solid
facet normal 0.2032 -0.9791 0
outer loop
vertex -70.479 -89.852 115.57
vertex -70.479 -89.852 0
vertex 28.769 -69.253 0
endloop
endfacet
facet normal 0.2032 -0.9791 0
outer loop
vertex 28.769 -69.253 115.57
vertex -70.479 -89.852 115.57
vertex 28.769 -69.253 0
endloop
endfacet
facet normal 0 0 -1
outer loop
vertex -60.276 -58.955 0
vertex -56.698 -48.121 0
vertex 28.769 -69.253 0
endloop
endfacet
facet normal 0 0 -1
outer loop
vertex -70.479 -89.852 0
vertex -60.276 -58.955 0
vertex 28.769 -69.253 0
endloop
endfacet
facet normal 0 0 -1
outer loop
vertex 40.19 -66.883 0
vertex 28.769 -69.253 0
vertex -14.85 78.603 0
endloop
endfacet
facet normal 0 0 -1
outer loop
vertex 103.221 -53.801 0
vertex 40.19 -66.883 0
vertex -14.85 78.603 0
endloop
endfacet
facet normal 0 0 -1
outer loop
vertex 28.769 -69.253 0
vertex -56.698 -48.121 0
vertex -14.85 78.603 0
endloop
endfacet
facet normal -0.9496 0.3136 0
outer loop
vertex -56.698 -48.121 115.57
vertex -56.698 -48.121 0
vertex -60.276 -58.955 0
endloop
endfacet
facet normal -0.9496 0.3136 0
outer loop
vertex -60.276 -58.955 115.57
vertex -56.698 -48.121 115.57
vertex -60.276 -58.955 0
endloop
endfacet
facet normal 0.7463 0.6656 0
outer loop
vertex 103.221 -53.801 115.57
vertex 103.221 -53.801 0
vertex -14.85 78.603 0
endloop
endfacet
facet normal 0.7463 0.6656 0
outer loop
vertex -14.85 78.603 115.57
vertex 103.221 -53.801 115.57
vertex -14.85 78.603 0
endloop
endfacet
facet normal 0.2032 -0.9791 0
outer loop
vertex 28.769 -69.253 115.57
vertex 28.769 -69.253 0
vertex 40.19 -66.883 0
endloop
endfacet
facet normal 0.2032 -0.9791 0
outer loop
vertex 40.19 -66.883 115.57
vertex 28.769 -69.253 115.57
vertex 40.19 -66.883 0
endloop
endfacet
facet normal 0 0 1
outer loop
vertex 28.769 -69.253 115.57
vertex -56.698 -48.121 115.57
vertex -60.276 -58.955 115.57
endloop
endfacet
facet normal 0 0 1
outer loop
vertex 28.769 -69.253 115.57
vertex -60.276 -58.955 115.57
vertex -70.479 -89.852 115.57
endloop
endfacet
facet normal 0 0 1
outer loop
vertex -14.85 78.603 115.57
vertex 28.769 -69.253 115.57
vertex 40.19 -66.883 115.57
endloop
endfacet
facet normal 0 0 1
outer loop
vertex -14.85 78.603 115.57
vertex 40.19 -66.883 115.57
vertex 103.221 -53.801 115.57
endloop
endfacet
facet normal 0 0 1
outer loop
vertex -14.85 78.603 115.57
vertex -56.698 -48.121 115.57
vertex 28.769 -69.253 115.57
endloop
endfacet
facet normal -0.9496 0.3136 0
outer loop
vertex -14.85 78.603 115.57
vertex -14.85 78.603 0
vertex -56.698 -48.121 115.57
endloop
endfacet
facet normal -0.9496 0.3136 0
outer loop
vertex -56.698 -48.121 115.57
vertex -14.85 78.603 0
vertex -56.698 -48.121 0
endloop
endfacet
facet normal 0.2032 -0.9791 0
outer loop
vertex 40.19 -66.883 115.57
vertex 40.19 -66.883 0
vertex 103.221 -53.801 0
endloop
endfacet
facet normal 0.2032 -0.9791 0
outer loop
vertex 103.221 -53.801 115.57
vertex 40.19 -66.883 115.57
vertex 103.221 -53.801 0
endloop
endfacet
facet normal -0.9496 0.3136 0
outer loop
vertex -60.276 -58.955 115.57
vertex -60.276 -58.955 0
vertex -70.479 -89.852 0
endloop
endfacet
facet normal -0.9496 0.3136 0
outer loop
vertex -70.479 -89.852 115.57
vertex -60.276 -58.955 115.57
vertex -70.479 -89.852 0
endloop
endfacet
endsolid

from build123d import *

# Parameters (mm, degrees)
F1_DEPTH = 115.57


with BuildPart() as f1:
    # F0 (on Top) → F1 (new body)
    with BuildSketch(Plane.XY):
        Polygon((103.221436145, -53.8007080909), (-14.8500475308, 78.6029756424), (-56.6983165312, -48.1207240324), (-0.6158898202, 27.4022637386), (40.1904460134, -66.8826025271), align=None)
        Polygon((28.7687712922, -69.2531371272), (-60.2760904722, -58.9548340499), (-70.4792593606, -89.85177055), align=None)
        Polygon((-0.6158898202, 27.4022637386), (-56.6983165312, -48.1207240324), (-60.2760904722, -58.9548340499), (28.7687712922, -69.2531371272), (40.1904460134, -66.8826025271), align=None)
    extrude(amount=F1_DEPTH)


solid = f1.part
